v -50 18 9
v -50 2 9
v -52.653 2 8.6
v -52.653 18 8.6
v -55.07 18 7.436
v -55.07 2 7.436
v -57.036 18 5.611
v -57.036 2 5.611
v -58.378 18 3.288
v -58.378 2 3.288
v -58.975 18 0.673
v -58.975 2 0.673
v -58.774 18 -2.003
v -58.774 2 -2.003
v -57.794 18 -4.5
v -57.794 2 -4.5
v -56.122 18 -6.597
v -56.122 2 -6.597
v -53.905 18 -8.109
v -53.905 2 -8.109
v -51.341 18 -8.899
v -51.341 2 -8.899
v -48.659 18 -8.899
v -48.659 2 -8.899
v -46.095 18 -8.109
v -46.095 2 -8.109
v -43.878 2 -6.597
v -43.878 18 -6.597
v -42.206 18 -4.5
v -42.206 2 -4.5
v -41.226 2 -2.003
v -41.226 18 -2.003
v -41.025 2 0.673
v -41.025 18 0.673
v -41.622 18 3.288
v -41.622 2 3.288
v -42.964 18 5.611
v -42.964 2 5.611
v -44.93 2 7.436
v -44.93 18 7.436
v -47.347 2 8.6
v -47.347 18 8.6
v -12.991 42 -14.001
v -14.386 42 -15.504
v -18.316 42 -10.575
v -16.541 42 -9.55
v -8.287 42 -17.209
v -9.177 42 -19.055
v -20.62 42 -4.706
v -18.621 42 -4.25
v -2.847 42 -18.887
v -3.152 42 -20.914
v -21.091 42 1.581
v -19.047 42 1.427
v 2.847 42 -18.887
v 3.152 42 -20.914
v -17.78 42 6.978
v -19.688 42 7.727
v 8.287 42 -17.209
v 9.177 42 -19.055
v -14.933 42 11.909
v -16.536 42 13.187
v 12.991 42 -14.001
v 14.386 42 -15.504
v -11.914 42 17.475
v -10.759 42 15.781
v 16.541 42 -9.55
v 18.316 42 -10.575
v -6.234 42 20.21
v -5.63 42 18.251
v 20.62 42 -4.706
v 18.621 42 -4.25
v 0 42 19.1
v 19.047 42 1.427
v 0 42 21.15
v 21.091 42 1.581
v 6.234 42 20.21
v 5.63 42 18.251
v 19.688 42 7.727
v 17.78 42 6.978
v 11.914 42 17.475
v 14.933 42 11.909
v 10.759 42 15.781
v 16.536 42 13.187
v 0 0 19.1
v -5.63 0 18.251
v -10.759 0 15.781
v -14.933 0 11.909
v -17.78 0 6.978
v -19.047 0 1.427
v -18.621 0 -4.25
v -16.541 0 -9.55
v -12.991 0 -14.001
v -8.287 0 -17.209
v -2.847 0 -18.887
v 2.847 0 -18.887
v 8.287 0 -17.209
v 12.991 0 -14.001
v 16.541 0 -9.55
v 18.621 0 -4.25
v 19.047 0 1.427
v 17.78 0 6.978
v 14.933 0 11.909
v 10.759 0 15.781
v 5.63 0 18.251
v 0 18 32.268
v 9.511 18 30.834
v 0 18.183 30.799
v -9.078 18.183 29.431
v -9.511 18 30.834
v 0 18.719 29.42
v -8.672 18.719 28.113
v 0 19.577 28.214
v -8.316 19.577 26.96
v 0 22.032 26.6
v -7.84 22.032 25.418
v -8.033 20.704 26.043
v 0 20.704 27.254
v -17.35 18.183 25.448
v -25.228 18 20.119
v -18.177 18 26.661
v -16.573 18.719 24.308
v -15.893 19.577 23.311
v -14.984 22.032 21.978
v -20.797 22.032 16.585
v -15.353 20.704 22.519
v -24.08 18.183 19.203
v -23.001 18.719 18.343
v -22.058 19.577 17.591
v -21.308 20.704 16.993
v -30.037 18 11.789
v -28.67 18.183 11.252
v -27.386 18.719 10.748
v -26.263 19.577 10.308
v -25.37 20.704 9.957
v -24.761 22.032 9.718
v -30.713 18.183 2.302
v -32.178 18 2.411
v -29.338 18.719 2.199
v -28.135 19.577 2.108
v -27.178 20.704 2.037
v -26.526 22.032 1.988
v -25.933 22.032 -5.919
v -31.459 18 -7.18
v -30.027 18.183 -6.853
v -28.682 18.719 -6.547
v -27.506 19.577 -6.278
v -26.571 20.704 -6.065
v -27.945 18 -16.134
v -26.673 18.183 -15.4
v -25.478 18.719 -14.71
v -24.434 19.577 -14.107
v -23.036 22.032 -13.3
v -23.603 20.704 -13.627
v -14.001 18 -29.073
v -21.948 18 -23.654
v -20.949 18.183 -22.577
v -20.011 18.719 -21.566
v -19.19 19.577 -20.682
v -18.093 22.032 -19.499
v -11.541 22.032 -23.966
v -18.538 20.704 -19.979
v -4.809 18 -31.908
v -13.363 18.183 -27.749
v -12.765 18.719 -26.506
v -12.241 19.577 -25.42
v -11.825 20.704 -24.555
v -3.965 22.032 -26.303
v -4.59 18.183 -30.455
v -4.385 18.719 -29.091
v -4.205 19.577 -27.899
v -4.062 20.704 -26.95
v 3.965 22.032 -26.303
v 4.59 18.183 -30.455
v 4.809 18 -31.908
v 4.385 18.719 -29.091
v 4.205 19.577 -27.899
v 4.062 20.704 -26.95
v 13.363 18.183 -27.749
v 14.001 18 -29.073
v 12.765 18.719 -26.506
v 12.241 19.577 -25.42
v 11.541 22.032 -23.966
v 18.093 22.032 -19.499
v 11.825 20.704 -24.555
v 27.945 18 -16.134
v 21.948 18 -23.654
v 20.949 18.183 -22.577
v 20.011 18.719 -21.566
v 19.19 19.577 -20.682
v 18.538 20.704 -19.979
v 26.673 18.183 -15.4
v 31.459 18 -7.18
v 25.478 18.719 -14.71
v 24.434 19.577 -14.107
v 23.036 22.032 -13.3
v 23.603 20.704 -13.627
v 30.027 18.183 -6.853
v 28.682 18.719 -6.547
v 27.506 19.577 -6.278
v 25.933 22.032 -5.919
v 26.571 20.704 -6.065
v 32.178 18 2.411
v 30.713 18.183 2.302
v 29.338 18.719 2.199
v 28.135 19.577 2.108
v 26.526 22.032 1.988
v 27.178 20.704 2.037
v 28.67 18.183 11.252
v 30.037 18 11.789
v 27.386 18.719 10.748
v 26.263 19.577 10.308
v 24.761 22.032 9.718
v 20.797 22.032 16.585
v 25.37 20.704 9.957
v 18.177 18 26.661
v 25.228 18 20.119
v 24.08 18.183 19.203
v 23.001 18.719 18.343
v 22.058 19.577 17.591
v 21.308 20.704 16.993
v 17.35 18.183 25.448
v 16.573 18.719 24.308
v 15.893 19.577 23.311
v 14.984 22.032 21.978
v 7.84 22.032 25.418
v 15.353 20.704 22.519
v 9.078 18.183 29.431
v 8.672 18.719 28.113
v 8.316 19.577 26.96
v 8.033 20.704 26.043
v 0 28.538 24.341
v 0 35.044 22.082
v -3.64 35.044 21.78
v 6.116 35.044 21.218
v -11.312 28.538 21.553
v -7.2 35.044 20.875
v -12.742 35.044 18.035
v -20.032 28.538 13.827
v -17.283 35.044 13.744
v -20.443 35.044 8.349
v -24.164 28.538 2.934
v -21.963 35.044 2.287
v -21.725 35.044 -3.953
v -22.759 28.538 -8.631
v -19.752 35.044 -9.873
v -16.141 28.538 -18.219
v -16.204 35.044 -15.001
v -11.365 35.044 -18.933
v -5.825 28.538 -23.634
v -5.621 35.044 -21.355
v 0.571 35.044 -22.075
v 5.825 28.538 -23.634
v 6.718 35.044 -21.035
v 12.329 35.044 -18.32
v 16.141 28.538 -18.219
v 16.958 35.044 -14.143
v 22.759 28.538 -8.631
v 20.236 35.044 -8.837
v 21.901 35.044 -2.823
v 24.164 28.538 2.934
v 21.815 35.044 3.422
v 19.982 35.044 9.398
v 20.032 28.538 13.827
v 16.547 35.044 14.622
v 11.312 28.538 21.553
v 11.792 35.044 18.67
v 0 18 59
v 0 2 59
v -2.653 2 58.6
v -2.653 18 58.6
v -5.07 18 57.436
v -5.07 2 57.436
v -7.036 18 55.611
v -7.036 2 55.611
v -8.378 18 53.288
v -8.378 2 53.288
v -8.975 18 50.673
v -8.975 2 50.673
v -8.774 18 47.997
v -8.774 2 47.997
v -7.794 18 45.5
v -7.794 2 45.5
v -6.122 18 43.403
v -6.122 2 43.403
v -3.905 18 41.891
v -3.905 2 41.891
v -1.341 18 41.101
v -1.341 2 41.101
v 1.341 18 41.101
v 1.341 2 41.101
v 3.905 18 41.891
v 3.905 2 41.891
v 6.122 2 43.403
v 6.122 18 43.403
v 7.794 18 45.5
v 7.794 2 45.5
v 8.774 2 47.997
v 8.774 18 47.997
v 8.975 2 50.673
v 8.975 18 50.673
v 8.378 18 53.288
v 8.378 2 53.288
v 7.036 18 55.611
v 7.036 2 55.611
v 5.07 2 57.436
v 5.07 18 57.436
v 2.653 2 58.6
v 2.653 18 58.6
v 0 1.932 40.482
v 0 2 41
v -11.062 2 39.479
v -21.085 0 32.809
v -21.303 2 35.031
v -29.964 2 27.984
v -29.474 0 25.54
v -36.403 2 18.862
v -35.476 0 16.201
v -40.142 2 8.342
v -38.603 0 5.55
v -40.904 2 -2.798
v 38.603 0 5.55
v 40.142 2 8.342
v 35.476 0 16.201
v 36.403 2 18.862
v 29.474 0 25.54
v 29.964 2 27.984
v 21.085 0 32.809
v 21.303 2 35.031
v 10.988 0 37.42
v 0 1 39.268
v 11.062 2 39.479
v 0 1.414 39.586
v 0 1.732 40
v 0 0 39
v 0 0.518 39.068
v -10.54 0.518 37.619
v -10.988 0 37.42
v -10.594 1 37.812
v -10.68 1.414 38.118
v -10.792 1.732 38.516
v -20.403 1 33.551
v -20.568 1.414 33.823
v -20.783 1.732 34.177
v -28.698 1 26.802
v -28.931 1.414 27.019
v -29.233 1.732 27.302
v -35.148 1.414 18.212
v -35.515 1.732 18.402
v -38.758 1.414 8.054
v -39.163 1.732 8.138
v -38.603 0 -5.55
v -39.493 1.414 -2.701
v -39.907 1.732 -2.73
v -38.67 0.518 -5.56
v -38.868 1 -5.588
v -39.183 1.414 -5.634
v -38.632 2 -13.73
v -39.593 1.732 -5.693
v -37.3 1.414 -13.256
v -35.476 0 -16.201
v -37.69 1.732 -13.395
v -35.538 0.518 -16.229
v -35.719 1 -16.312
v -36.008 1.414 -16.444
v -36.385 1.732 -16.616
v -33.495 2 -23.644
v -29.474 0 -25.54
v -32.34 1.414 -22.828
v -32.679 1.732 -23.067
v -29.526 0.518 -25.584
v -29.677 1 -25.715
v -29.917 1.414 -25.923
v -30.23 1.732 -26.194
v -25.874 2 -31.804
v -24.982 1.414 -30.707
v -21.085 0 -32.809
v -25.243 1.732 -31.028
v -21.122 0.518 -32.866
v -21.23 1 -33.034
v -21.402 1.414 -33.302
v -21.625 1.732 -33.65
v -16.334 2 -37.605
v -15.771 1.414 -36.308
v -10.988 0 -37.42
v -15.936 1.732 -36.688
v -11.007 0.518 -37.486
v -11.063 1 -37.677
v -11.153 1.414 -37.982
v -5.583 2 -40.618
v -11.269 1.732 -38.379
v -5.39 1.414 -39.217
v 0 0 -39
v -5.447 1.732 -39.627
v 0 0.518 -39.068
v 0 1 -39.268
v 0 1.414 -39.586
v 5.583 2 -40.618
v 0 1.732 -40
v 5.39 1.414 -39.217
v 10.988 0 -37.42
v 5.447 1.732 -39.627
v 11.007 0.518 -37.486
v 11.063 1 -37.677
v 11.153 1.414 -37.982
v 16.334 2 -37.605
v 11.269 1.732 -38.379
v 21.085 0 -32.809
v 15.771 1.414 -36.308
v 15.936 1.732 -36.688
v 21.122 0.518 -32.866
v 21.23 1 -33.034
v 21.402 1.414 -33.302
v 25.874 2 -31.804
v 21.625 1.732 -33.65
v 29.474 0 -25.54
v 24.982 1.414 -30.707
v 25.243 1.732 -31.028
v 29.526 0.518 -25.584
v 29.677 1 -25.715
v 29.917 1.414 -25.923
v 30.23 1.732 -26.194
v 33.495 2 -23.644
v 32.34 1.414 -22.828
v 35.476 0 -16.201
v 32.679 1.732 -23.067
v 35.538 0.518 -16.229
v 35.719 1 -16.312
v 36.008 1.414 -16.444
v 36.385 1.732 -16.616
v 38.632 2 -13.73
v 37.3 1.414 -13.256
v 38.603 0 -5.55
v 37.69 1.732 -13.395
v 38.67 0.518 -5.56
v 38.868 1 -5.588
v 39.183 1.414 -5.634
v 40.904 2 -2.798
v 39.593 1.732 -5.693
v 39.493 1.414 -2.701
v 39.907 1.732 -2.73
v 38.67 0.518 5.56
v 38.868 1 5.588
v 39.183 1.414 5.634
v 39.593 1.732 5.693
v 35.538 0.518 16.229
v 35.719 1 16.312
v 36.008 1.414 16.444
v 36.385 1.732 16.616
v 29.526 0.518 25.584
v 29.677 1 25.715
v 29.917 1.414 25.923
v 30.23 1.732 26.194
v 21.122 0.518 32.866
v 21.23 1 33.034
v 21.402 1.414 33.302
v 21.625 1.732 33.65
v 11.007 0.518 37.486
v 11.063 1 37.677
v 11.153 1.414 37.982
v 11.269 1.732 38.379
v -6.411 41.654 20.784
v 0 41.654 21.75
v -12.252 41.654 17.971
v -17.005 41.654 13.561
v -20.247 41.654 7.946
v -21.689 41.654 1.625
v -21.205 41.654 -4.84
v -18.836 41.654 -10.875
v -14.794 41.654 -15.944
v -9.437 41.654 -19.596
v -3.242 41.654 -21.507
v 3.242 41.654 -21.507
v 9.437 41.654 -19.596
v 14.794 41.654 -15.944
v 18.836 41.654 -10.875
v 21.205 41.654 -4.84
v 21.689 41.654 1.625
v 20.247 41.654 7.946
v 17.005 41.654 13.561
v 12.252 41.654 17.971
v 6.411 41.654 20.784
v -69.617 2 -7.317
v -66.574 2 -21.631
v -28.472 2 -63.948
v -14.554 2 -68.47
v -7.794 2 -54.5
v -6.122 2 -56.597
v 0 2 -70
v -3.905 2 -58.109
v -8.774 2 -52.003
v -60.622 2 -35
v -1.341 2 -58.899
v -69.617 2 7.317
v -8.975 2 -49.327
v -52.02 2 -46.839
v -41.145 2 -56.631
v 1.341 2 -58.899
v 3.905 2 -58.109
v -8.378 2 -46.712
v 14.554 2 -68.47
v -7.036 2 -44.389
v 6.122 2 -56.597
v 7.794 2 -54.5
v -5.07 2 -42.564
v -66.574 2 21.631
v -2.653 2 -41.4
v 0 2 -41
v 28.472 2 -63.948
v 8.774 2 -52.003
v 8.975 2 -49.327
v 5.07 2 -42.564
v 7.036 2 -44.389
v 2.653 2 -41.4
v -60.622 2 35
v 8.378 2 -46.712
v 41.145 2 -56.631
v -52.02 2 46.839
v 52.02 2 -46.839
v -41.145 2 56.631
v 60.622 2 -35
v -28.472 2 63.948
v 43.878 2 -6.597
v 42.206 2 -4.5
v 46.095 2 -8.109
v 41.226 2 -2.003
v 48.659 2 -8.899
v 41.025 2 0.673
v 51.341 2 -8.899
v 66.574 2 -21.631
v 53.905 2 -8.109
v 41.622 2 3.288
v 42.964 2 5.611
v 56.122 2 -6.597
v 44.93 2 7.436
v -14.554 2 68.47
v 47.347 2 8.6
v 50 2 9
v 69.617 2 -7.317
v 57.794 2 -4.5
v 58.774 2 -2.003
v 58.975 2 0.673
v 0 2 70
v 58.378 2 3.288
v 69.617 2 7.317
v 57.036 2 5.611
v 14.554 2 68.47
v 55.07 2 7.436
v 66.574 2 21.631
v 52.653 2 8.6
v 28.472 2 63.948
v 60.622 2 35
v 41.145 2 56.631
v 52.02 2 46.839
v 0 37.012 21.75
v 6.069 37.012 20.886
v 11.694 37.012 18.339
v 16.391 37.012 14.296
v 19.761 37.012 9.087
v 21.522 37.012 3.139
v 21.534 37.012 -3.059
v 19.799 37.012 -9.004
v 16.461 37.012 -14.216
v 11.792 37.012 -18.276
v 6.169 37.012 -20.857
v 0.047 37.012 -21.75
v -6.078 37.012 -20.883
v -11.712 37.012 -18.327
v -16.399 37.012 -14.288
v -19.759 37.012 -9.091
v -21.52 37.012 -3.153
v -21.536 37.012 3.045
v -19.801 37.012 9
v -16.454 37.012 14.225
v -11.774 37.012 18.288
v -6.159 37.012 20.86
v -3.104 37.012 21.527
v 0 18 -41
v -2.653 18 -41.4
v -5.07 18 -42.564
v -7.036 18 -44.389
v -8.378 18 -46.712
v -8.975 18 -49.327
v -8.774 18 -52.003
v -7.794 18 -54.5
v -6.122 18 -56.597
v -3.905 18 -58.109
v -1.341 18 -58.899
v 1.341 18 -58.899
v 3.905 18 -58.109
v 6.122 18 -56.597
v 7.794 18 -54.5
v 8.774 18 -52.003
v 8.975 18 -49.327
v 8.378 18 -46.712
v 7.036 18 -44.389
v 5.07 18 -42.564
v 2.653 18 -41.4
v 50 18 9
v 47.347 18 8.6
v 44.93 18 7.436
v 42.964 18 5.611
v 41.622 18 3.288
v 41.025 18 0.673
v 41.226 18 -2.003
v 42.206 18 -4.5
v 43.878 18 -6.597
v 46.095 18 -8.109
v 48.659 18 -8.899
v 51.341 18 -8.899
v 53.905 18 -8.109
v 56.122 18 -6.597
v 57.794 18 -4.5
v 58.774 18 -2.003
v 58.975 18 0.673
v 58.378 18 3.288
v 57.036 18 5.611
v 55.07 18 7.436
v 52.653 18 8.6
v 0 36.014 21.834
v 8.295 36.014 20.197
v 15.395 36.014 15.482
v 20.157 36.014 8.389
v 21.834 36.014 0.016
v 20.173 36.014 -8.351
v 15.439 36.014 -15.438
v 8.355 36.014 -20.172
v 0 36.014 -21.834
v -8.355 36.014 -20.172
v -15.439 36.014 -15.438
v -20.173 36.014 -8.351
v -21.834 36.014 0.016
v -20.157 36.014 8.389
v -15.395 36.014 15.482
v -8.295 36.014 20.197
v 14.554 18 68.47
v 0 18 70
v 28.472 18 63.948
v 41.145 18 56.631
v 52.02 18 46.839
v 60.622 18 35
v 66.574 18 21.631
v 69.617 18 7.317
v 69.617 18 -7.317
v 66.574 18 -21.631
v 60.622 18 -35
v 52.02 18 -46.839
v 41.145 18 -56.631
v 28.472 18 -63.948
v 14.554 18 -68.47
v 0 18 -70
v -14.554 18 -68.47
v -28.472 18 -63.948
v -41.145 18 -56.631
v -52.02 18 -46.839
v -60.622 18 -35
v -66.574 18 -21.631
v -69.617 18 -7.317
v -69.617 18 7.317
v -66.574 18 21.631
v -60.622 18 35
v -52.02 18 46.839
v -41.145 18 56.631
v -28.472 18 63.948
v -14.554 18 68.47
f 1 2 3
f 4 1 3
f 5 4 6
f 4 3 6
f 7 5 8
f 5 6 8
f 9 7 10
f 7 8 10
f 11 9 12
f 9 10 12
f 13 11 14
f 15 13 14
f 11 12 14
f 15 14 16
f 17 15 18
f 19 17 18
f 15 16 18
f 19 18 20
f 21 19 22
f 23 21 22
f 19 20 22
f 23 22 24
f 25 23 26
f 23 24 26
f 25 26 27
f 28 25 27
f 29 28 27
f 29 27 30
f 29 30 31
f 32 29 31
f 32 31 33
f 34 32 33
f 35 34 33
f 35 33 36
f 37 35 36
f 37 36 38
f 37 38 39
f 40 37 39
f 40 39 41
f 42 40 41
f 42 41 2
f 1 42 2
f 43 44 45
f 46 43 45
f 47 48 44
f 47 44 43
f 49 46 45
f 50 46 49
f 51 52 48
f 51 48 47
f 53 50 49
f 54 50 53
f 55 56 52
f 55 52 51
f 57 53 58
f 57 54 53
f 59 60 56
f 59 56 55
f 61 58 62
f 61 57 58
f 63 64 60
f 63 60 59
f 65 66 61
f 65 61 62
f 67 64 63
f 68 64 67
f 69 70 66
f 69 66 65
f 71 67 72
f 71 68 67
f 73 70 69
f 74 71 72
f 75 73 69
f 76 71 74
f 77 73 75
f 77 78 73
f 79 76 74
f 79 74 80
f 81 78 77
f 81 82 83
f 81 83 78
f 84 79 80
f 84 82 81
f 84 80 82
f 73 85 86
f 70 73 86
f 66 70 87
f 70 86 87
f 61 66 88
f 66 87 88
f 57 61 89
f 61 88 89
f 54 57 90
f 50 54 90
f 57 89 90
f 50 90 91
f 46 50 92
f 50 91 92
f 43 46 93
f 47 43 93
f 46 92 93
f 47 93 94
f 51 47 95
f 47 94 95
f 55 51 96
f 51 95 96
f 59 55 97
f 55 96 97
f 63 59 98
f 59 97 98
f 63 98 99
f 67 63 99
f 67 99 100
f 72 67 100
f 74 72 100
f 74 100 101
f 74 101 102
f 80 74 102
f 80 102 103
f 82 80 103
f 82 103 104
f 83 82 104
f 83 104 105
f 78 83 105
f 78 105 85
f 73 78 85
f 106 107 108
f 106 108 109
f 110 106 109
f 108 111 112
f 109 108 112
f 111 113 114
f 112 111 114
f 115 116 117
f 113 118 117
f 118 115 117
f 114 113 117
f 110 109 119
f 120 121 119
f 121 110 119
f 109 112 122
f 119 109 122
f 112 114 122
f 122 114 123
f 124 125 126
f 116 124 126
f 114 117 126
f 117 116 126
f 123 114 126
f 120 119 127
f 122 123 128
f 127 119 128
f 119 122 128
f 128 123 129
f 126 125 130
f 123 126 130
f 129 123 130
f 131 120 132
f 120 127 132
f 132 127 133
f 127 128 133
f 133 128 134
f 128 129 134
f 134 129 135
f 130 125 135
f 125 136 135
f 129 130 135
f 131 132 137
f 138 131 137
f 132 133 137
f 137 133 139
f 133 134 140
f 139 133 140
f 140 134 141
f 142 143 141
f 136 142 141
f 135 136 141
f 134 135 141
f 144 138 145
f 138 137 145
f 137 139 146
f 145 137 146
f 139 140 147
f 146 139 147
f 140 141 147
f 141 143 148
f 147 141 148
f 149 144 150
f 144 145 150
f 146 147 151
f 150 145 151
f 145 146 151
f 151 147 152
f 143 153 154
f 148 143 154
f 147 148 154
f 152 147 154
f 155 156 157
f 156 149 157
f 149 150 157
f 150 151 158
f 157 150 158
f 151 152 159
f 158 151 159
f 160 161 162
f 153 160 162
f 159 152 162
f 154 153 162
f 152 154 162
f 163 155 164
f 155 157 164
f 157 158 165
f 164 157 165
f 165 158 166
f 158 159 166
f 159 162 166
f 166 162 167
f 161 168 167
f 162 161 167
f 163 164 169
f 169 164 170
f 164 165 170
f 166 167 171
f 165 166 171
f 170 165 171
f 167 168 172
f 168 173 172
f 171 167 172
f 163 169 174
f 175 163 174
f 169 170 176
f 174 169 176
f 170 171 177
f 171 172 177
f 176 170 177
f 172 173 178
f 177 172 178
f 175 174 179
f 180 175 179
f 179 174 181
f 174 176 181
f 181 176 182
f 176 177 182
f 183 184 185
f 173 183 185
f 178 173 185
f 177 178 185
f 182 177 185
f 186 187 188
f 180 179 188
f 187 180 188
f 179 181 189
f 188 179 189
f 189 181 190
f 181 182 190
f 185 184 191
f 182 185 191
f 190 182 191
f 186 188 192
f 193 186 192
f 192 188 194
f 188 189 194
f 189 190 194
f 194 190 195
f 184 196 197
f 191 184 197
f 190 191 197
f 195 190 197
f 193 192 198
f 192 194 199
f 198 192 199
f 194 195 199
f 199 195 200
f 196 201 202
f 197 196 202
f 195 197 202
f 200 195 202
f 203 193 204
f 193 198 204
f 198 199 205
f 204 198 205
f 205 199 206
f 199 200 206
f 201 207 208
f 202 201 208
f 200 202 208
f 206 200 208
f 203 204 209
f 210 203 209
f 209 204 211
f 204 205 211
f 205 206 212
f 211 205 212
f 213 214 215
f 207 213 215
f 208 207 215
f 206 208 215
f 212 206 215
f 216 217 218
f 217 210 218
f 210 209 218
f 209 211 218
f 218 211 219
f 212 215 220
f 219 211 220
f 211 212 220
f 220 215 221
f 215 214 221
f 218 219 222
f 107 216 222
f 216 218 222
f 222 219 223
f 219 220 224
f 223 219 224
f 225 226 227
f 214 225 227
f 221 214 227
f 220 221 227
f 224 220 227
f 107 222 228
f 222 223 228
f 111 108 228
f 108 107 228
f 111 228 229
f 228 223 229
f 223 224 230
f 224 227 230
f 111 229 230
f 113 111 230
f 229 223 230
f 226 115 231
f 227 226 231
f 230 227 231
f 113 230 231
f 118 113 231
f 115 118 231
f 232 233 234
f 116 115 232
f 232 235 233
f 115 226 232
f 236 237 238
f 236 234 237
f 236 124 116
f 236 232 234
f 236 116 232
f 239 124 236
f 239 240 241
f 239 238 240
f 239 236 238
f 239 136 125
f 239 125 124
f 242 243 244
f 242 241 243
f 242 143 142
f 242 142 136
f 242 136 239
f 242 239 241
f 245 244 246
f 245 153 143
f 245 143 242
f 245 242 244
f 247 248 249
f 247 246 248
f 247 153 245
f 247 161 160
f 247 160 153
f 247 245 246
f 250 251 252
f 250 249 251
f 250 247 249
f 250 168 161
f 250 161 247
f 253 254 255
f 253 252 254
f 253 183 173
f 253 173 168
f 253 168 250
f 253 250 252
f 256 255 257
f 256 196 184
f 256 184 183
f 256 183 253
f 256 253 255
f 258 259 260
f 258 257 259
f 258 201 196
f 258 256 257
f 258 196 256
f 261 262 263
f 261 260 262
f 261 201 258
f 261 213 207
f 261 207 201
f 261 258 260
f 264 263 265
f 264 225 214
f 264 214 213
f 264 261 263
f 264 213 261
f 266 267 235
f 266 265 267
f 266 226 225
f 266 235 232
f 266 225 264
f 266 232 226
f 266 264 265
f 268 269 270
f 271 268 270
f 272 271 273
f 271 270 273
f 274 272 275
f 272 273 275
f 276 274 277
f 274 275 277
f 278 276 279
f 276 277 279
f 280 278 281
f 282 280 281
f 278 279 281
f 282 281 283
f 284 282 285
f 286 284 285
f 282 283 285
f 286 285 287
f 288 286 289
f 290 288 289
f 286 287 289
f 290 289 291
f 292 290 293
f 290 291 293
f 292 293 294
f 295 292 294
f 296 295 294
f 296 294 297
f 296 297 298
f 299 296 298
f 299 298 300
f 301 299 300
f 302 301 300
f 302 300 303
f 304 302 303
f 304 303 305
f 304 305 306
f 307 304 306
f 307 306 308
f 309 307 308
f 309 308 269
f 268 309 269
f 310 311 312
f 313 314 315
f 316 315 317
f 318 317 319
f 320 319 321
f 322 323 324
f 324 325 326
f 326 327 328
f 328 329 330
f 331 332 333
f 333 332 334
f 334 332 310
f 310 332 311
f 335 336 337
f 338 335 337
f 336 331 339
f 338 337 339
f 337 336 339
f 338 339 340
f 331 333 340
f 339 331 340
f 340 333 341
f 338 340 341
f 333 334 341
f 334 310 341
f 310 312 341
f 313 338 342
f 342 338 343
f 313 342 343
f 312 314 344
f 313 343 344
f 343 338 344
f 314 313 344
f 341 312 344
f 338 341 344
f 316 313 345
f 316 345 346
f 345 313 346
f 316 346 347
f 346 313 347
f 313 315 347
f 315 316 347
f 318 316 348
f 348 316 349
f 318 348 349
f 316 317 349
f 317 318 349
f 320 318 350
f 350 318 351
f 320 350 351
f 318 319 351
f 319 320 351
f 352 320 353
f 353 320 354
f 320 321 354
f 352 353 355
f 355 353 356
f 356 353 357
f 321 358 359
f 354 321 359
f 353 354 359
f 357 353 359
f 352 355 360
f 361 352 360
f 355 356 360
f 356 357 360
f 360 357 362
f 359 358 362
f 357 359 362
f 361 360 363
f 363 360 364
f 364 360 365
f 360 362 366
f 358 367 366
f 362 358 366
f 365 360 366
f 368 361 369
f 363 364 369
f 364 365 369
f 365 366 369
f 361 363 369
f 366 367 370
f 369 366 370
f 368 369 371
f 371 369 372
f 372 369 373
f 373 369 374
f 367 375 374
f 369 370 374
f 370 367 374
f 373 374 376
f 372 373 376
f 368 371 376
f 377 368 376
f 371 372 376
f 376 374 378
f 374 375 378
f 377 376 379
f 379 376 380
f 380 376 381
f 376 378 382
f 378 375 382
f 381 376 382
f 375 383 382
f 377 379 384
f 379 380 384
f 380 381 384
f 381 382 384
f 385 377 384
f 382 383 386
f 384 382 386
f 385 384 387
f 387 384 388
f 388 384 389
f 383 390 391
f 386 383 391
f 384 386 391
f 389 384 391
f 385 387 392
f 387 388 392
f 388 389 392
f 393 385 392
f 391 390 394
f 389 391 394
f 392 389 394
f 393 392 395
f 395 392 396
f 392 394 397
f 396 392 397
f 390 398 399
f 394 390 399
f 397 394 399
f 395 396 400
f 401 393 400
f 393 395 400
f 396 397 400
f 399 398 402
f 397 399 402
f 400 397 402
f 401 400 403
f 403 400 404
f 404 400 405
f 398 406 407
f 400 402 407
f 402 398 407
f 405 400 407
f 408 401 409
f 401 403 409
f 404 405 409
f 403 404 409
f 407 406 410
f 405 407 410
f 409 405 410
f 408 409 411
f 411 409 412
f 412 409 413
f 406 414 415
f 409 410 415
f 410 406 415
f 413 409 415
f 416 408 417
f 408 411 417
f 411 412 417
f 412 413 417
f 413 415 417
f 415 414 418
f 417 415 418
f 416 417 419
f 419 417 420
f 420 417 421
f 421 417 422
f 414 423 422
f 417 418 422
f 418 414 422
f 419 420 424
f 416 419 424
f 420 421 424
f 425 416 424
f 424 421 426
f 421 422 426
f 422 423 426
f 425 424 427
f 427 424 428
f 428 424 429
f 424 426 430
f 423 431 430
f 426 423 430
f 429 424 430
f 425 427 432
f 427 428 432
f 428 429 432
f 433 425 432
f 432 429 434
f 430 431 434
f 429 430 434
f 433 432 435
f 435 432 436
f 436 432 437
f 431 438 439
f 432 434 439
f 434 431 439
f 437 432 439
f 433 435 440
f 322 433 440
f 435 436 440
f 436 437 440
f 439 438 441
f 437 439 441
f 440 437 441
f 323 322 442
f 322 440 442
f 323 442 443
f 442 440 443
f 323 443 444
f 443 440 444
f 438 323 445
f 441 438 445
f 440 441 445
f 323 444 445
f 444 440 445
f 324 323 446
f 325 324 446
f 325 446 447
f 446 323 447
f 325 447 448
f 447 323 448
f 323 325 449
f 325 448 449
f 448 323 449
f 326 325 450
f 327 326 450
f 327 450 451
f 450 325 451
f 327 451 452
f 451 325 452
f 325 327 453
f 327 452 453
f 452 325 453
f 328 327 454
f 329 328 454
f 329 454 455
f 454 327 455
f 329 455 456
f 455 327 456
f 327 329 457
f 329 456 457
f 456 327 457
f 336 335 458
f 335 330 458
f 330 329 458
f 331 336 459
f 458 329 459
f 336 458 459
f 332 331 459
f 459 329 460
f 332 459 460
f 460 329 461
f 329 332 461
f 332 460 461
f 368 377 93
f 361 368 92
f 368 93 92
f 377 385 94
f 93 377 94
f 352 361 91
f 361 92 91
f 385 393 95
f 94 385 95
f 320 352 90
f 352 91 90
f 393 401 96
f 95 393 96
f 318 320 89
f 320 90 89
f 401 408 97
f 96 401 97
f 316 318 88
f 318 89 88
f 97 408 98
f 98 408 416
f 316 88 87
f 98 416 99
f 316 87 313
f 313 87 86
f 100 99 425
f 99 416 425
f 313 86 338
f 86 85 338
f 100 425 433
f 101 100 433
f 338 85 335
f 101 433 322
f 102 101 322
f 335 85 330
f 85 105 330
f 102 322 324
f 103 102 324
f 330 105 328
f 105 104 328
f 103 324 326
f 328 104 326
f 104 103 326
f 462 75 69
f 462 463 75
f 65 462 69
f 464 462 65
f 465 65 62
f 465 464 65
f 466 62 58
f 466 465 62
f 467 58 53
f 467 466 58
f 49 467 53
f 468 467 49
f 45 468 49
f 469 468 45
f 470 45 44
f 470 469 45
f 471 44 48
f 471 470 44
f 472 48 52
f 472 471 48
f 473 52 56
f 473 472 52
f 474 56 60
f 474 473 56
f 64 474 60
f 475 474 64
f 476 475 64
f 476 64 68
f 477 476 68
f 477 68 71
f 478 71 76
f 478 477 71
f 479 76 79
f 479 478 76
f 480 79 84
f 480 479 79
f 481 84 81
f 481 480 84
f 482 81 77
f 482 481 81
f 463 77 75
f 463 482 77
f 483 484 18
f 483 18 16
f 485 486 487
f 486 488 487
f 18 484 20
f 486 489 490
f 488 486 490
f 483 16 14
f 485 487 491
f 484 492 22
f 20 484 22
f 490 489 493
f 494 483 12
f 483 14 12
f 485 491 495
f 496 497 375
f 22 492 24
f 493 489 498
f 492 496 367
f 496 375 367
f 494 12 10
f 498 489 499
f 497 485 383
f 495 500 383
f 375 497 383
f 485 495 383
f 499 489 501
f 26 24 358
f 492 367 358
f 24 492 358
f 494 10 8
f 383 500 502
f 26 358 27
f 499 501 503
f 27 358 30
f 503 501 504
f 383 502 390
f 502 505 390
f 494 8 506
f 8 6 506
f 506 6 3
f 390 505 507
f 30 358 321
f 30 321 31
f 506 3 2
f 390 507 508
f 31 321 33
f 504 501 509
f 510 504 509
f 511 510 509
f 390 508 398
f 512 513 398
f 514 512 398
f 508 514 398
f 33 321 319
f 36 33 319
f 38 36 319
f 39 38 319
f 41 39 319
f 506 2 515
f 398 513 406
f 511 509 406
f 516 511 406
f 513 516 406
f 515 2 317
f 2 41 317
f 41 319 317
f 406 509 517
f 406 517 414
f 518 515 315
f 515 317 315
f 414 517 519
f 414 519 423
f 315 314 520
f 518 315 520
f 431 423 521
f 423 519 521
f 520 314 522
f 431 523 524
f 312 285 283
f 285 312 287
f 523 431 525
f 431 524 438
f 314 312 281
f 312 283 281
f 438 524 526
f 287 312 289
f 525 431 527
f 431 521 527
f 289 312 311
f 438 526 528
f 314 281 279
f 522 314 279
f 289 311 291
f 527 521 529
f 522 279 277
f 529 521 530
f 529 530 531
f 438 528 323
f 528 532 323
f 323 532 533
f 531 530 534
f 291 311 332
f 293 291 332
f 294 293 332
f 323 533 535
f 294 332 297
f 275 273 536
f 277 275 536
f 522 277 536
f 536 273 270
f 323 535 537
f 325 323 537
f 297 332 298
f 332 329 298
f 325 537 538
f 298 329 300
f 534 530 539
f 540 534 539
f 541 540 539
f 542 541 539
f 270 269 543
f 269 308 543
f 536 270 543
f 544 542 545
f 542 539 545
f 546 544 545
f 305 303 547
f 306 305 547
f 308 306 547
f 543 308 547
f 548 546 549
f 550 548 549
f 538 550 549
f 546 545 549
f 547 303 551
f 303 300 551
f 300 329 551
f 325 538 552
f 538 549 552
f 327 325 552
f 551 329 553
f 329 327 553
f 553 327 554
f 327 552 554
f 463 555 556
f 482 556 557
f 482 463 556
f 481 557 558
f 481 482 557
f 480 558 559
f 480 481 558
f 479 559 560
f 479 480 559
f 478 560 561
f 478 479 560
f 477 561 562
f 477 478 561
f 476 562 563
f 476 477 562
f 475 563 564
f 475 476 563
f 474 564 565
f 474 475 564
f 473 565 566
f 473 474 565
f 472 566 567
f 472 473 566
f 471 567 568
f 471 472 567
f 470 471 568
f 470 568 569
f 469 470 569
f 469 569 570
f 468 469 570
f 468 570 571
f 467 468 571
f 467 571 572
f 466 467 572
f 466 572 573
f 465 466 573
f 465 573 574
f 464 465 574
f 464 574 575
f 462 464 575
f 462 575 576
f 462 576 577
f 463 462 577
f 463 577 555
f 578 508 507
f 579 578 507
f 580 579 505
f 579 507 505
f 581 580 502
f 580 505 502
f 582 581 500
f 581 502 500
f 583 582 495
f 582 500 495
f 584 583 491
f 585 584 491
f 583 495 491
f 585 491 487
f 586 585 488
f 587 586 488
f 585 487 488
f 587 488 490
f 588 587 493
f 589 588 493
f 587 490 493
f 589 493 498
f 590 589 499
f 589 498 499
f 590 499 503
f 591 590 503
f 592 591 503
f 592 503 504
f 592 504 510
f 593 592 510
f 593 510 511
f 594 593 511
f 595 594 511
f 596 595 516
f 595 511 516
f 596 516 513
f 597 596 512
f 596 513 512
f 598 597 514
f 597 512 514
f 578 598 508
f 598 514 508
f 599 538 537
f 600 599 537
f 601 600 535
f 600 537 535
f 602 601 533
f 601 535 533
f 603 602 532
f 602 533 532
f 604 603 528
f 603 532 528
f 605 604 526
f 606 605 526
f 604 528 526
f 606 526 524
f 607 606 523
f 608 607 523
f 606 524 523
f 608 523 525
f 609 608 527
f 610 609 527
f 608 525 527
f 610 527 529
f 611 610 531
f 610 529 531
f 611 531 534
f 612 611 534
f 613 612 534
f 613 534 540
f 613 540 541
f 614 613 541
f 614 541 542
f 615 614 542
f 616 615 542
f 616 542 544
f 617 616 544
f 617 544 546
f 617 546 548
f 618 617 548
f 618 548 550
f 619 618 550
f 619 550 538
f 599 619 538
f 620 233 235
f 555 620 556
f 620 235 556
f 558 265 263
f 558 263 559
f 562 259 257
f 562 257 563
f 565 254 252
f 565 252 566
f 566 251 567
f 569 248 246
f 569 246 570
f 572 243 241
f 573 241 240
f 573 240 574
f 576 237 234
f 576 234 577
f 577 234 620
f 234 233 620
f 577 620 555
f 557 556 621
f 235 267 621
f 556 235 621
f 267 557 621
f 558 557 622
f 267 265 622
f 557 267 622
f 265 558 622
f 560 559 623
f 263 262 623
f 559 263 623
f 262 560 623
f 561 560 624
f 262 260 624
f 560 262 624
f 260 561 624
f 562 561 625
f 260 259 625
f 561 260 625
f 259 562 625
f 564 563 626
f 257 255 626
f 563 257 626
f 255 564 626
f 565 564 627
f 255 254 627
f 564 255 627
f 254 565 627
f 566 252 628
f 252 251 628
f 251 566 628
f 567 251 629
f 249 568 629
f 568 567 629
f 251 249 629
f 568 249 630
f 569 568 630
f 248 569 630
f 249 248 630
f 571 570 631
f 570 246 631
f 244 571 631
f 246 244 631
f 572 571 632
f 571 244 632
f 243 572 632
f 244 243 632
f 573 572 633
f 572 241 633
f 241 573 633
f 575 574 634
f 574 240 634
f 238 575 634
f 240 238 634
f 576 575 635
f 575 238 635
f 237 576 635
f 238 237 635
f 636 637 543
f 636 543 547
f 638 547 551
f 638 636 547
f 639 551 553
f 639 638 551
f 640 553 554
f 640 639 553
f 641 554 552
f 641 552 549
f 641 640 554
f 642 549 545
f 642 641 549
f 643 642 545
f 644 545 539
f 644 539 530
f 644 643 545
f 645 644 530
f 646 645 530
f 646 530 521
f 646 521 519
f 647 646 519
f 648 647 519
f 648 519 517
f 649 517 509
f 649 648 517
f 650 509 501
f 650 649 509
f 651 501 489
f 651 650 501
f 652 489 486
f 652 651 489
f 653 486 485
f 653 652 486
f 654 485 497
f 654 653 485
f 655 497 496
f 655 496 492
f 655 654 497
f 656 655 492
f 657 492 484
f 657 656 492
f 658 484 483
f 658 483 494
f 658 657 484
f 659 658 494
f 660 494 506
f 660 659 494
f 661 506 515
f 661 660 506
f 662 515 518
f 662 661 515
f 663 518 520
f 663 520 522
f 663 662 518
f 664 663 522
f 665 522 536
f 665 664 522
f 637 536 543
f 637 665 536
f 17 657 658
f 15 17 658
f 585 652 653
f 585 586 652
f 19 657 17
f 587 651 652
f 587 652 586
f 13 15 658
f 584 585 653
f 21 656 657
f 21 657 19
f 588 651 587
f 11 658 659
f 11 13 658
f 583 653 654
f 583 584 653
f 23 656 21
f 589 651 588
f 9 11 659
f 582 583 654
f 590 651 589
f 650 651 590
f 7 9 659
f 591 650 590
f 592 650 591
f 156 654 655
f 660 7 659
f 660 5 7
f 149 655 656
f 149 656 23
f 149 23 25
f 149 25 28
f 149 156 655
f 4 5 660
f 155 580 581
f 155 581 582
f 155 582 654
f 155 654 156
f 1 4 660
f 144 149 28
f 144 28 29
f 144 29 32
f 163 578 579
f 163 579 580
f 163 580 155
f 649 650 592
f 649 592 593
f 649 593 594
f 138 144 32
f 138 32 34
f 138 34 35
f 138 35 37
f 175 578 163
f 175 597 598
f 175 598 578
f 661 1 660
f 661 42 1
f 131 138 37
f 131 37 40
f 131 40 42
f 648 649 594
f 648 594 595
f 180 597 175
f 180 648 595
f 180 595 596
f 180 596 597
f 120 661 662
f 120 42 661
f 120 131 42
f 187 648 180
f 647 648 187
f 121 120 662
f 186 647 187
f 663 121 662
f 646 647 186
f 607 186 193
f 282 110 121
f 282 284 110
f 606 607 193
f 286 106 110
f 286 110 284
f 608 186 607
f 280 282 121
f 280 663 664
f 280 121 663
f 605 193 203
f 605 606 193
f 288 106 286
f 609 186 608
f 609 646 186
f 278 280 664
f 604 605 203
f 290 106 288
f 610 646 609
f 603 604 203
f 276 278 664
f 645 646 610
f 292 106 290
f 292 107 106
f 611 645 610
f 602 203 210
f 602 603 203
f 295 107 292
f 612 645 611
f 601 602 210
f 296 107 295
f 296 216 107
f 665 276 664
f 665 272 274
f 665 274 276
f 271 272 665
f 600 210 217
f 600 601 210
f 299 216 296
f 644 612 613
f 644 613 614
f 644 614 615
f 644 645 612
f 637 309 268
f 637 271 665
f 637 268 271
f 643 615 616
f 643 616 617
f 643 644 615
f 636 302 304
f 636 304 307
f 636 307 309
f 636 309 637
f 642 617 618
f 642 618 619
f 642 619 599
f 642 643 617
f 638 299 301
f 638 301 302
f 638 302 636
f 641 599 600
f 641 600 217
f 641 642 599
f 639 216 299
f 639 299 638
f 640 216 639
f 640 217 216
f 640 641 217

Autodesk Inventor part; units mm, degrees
ref_plane "YZ Plane" through (0, 0, 0) normal (1, 0, 0) x (0, 1, 0)
ref_plane "XZ Plane" through (0, 0, 0) normal (0, 1, 0) x (-1, 0, 0)
ref_plane "XY Plane" through (0, 0, 0) normal (0, 0, 1) x (1, 0, 0)
sketch "Sketch1" plane through (0, 0, 0) normal (1, 0, 0) x (0, 1, 0)
  line L0 (0, 0) -> (150, 0)
  line L1 (0, 0) -> (0, 39)
  line L2 (0, 39) -> (2, 39)
  line L3 (2, 39) -> (2, 70)
  line L4 (2, 70) -> (18, 70)
  line L5 (18, 70) -> (18, 28)
  line L6 (18, 28) -> (36, 21.75)
  line L7 (36, 21.75) -> (42, 21.75)
  line L8 (42, 21.75) -> (42, 0)
  dimension "d0" = 150
  dimension "d1" = 78
  dimension "d2" = 140
  dimension "d3" = 56
  dimension "d4" = 43.5
  dimension "d5" = 2
  dimension "d6" = 18
  dimension "d7" = 6
  dimension "d8" = 42
revolve "Revolution1" add sketch "Sketch1" angle 360 about axis through (0, 0, 0) along (0, 1, 0)
fillet "Fillet1" radius 2 1 edges at (0, 2, -39)
fillet "Fillet2" radius 6 2 edges at (0, 18, -28) (0, 36, -21.75)
chamfer "Chamfer1" distance 0.6 angle 30 1 edges at (0, 42, -21.75) measured on face at (-7.8802, 42, -7.0393)
sketch "Sketch2" plane through (0, 18, 0) normal (0, 1, 0) x (1, 0, 0)
  point P0 (0, 0)
  point P1 (-50, 0)
  point P2 (0, 50)
  point P3 (50, 0)
  point P4 (0, -50)
hole "Hole1" at (-50, 18, 0) at (0, 18, -50) at (50, 18, 0) at (0, 18, 50) direction (0, -1, 0) diameter 18 end through all
sketch "Sketch4" plane through (0, 42, 0) normal (0, 1, 0) x (1, 0, 0)
  point P0 (0, 0)
  point P1 (0, 0)
hole "Hole2" at (0, 42, 0) direction (0, -1, 0) diameter 38.2 end through all
properties part number "karima" material "Steel, Alloy"
